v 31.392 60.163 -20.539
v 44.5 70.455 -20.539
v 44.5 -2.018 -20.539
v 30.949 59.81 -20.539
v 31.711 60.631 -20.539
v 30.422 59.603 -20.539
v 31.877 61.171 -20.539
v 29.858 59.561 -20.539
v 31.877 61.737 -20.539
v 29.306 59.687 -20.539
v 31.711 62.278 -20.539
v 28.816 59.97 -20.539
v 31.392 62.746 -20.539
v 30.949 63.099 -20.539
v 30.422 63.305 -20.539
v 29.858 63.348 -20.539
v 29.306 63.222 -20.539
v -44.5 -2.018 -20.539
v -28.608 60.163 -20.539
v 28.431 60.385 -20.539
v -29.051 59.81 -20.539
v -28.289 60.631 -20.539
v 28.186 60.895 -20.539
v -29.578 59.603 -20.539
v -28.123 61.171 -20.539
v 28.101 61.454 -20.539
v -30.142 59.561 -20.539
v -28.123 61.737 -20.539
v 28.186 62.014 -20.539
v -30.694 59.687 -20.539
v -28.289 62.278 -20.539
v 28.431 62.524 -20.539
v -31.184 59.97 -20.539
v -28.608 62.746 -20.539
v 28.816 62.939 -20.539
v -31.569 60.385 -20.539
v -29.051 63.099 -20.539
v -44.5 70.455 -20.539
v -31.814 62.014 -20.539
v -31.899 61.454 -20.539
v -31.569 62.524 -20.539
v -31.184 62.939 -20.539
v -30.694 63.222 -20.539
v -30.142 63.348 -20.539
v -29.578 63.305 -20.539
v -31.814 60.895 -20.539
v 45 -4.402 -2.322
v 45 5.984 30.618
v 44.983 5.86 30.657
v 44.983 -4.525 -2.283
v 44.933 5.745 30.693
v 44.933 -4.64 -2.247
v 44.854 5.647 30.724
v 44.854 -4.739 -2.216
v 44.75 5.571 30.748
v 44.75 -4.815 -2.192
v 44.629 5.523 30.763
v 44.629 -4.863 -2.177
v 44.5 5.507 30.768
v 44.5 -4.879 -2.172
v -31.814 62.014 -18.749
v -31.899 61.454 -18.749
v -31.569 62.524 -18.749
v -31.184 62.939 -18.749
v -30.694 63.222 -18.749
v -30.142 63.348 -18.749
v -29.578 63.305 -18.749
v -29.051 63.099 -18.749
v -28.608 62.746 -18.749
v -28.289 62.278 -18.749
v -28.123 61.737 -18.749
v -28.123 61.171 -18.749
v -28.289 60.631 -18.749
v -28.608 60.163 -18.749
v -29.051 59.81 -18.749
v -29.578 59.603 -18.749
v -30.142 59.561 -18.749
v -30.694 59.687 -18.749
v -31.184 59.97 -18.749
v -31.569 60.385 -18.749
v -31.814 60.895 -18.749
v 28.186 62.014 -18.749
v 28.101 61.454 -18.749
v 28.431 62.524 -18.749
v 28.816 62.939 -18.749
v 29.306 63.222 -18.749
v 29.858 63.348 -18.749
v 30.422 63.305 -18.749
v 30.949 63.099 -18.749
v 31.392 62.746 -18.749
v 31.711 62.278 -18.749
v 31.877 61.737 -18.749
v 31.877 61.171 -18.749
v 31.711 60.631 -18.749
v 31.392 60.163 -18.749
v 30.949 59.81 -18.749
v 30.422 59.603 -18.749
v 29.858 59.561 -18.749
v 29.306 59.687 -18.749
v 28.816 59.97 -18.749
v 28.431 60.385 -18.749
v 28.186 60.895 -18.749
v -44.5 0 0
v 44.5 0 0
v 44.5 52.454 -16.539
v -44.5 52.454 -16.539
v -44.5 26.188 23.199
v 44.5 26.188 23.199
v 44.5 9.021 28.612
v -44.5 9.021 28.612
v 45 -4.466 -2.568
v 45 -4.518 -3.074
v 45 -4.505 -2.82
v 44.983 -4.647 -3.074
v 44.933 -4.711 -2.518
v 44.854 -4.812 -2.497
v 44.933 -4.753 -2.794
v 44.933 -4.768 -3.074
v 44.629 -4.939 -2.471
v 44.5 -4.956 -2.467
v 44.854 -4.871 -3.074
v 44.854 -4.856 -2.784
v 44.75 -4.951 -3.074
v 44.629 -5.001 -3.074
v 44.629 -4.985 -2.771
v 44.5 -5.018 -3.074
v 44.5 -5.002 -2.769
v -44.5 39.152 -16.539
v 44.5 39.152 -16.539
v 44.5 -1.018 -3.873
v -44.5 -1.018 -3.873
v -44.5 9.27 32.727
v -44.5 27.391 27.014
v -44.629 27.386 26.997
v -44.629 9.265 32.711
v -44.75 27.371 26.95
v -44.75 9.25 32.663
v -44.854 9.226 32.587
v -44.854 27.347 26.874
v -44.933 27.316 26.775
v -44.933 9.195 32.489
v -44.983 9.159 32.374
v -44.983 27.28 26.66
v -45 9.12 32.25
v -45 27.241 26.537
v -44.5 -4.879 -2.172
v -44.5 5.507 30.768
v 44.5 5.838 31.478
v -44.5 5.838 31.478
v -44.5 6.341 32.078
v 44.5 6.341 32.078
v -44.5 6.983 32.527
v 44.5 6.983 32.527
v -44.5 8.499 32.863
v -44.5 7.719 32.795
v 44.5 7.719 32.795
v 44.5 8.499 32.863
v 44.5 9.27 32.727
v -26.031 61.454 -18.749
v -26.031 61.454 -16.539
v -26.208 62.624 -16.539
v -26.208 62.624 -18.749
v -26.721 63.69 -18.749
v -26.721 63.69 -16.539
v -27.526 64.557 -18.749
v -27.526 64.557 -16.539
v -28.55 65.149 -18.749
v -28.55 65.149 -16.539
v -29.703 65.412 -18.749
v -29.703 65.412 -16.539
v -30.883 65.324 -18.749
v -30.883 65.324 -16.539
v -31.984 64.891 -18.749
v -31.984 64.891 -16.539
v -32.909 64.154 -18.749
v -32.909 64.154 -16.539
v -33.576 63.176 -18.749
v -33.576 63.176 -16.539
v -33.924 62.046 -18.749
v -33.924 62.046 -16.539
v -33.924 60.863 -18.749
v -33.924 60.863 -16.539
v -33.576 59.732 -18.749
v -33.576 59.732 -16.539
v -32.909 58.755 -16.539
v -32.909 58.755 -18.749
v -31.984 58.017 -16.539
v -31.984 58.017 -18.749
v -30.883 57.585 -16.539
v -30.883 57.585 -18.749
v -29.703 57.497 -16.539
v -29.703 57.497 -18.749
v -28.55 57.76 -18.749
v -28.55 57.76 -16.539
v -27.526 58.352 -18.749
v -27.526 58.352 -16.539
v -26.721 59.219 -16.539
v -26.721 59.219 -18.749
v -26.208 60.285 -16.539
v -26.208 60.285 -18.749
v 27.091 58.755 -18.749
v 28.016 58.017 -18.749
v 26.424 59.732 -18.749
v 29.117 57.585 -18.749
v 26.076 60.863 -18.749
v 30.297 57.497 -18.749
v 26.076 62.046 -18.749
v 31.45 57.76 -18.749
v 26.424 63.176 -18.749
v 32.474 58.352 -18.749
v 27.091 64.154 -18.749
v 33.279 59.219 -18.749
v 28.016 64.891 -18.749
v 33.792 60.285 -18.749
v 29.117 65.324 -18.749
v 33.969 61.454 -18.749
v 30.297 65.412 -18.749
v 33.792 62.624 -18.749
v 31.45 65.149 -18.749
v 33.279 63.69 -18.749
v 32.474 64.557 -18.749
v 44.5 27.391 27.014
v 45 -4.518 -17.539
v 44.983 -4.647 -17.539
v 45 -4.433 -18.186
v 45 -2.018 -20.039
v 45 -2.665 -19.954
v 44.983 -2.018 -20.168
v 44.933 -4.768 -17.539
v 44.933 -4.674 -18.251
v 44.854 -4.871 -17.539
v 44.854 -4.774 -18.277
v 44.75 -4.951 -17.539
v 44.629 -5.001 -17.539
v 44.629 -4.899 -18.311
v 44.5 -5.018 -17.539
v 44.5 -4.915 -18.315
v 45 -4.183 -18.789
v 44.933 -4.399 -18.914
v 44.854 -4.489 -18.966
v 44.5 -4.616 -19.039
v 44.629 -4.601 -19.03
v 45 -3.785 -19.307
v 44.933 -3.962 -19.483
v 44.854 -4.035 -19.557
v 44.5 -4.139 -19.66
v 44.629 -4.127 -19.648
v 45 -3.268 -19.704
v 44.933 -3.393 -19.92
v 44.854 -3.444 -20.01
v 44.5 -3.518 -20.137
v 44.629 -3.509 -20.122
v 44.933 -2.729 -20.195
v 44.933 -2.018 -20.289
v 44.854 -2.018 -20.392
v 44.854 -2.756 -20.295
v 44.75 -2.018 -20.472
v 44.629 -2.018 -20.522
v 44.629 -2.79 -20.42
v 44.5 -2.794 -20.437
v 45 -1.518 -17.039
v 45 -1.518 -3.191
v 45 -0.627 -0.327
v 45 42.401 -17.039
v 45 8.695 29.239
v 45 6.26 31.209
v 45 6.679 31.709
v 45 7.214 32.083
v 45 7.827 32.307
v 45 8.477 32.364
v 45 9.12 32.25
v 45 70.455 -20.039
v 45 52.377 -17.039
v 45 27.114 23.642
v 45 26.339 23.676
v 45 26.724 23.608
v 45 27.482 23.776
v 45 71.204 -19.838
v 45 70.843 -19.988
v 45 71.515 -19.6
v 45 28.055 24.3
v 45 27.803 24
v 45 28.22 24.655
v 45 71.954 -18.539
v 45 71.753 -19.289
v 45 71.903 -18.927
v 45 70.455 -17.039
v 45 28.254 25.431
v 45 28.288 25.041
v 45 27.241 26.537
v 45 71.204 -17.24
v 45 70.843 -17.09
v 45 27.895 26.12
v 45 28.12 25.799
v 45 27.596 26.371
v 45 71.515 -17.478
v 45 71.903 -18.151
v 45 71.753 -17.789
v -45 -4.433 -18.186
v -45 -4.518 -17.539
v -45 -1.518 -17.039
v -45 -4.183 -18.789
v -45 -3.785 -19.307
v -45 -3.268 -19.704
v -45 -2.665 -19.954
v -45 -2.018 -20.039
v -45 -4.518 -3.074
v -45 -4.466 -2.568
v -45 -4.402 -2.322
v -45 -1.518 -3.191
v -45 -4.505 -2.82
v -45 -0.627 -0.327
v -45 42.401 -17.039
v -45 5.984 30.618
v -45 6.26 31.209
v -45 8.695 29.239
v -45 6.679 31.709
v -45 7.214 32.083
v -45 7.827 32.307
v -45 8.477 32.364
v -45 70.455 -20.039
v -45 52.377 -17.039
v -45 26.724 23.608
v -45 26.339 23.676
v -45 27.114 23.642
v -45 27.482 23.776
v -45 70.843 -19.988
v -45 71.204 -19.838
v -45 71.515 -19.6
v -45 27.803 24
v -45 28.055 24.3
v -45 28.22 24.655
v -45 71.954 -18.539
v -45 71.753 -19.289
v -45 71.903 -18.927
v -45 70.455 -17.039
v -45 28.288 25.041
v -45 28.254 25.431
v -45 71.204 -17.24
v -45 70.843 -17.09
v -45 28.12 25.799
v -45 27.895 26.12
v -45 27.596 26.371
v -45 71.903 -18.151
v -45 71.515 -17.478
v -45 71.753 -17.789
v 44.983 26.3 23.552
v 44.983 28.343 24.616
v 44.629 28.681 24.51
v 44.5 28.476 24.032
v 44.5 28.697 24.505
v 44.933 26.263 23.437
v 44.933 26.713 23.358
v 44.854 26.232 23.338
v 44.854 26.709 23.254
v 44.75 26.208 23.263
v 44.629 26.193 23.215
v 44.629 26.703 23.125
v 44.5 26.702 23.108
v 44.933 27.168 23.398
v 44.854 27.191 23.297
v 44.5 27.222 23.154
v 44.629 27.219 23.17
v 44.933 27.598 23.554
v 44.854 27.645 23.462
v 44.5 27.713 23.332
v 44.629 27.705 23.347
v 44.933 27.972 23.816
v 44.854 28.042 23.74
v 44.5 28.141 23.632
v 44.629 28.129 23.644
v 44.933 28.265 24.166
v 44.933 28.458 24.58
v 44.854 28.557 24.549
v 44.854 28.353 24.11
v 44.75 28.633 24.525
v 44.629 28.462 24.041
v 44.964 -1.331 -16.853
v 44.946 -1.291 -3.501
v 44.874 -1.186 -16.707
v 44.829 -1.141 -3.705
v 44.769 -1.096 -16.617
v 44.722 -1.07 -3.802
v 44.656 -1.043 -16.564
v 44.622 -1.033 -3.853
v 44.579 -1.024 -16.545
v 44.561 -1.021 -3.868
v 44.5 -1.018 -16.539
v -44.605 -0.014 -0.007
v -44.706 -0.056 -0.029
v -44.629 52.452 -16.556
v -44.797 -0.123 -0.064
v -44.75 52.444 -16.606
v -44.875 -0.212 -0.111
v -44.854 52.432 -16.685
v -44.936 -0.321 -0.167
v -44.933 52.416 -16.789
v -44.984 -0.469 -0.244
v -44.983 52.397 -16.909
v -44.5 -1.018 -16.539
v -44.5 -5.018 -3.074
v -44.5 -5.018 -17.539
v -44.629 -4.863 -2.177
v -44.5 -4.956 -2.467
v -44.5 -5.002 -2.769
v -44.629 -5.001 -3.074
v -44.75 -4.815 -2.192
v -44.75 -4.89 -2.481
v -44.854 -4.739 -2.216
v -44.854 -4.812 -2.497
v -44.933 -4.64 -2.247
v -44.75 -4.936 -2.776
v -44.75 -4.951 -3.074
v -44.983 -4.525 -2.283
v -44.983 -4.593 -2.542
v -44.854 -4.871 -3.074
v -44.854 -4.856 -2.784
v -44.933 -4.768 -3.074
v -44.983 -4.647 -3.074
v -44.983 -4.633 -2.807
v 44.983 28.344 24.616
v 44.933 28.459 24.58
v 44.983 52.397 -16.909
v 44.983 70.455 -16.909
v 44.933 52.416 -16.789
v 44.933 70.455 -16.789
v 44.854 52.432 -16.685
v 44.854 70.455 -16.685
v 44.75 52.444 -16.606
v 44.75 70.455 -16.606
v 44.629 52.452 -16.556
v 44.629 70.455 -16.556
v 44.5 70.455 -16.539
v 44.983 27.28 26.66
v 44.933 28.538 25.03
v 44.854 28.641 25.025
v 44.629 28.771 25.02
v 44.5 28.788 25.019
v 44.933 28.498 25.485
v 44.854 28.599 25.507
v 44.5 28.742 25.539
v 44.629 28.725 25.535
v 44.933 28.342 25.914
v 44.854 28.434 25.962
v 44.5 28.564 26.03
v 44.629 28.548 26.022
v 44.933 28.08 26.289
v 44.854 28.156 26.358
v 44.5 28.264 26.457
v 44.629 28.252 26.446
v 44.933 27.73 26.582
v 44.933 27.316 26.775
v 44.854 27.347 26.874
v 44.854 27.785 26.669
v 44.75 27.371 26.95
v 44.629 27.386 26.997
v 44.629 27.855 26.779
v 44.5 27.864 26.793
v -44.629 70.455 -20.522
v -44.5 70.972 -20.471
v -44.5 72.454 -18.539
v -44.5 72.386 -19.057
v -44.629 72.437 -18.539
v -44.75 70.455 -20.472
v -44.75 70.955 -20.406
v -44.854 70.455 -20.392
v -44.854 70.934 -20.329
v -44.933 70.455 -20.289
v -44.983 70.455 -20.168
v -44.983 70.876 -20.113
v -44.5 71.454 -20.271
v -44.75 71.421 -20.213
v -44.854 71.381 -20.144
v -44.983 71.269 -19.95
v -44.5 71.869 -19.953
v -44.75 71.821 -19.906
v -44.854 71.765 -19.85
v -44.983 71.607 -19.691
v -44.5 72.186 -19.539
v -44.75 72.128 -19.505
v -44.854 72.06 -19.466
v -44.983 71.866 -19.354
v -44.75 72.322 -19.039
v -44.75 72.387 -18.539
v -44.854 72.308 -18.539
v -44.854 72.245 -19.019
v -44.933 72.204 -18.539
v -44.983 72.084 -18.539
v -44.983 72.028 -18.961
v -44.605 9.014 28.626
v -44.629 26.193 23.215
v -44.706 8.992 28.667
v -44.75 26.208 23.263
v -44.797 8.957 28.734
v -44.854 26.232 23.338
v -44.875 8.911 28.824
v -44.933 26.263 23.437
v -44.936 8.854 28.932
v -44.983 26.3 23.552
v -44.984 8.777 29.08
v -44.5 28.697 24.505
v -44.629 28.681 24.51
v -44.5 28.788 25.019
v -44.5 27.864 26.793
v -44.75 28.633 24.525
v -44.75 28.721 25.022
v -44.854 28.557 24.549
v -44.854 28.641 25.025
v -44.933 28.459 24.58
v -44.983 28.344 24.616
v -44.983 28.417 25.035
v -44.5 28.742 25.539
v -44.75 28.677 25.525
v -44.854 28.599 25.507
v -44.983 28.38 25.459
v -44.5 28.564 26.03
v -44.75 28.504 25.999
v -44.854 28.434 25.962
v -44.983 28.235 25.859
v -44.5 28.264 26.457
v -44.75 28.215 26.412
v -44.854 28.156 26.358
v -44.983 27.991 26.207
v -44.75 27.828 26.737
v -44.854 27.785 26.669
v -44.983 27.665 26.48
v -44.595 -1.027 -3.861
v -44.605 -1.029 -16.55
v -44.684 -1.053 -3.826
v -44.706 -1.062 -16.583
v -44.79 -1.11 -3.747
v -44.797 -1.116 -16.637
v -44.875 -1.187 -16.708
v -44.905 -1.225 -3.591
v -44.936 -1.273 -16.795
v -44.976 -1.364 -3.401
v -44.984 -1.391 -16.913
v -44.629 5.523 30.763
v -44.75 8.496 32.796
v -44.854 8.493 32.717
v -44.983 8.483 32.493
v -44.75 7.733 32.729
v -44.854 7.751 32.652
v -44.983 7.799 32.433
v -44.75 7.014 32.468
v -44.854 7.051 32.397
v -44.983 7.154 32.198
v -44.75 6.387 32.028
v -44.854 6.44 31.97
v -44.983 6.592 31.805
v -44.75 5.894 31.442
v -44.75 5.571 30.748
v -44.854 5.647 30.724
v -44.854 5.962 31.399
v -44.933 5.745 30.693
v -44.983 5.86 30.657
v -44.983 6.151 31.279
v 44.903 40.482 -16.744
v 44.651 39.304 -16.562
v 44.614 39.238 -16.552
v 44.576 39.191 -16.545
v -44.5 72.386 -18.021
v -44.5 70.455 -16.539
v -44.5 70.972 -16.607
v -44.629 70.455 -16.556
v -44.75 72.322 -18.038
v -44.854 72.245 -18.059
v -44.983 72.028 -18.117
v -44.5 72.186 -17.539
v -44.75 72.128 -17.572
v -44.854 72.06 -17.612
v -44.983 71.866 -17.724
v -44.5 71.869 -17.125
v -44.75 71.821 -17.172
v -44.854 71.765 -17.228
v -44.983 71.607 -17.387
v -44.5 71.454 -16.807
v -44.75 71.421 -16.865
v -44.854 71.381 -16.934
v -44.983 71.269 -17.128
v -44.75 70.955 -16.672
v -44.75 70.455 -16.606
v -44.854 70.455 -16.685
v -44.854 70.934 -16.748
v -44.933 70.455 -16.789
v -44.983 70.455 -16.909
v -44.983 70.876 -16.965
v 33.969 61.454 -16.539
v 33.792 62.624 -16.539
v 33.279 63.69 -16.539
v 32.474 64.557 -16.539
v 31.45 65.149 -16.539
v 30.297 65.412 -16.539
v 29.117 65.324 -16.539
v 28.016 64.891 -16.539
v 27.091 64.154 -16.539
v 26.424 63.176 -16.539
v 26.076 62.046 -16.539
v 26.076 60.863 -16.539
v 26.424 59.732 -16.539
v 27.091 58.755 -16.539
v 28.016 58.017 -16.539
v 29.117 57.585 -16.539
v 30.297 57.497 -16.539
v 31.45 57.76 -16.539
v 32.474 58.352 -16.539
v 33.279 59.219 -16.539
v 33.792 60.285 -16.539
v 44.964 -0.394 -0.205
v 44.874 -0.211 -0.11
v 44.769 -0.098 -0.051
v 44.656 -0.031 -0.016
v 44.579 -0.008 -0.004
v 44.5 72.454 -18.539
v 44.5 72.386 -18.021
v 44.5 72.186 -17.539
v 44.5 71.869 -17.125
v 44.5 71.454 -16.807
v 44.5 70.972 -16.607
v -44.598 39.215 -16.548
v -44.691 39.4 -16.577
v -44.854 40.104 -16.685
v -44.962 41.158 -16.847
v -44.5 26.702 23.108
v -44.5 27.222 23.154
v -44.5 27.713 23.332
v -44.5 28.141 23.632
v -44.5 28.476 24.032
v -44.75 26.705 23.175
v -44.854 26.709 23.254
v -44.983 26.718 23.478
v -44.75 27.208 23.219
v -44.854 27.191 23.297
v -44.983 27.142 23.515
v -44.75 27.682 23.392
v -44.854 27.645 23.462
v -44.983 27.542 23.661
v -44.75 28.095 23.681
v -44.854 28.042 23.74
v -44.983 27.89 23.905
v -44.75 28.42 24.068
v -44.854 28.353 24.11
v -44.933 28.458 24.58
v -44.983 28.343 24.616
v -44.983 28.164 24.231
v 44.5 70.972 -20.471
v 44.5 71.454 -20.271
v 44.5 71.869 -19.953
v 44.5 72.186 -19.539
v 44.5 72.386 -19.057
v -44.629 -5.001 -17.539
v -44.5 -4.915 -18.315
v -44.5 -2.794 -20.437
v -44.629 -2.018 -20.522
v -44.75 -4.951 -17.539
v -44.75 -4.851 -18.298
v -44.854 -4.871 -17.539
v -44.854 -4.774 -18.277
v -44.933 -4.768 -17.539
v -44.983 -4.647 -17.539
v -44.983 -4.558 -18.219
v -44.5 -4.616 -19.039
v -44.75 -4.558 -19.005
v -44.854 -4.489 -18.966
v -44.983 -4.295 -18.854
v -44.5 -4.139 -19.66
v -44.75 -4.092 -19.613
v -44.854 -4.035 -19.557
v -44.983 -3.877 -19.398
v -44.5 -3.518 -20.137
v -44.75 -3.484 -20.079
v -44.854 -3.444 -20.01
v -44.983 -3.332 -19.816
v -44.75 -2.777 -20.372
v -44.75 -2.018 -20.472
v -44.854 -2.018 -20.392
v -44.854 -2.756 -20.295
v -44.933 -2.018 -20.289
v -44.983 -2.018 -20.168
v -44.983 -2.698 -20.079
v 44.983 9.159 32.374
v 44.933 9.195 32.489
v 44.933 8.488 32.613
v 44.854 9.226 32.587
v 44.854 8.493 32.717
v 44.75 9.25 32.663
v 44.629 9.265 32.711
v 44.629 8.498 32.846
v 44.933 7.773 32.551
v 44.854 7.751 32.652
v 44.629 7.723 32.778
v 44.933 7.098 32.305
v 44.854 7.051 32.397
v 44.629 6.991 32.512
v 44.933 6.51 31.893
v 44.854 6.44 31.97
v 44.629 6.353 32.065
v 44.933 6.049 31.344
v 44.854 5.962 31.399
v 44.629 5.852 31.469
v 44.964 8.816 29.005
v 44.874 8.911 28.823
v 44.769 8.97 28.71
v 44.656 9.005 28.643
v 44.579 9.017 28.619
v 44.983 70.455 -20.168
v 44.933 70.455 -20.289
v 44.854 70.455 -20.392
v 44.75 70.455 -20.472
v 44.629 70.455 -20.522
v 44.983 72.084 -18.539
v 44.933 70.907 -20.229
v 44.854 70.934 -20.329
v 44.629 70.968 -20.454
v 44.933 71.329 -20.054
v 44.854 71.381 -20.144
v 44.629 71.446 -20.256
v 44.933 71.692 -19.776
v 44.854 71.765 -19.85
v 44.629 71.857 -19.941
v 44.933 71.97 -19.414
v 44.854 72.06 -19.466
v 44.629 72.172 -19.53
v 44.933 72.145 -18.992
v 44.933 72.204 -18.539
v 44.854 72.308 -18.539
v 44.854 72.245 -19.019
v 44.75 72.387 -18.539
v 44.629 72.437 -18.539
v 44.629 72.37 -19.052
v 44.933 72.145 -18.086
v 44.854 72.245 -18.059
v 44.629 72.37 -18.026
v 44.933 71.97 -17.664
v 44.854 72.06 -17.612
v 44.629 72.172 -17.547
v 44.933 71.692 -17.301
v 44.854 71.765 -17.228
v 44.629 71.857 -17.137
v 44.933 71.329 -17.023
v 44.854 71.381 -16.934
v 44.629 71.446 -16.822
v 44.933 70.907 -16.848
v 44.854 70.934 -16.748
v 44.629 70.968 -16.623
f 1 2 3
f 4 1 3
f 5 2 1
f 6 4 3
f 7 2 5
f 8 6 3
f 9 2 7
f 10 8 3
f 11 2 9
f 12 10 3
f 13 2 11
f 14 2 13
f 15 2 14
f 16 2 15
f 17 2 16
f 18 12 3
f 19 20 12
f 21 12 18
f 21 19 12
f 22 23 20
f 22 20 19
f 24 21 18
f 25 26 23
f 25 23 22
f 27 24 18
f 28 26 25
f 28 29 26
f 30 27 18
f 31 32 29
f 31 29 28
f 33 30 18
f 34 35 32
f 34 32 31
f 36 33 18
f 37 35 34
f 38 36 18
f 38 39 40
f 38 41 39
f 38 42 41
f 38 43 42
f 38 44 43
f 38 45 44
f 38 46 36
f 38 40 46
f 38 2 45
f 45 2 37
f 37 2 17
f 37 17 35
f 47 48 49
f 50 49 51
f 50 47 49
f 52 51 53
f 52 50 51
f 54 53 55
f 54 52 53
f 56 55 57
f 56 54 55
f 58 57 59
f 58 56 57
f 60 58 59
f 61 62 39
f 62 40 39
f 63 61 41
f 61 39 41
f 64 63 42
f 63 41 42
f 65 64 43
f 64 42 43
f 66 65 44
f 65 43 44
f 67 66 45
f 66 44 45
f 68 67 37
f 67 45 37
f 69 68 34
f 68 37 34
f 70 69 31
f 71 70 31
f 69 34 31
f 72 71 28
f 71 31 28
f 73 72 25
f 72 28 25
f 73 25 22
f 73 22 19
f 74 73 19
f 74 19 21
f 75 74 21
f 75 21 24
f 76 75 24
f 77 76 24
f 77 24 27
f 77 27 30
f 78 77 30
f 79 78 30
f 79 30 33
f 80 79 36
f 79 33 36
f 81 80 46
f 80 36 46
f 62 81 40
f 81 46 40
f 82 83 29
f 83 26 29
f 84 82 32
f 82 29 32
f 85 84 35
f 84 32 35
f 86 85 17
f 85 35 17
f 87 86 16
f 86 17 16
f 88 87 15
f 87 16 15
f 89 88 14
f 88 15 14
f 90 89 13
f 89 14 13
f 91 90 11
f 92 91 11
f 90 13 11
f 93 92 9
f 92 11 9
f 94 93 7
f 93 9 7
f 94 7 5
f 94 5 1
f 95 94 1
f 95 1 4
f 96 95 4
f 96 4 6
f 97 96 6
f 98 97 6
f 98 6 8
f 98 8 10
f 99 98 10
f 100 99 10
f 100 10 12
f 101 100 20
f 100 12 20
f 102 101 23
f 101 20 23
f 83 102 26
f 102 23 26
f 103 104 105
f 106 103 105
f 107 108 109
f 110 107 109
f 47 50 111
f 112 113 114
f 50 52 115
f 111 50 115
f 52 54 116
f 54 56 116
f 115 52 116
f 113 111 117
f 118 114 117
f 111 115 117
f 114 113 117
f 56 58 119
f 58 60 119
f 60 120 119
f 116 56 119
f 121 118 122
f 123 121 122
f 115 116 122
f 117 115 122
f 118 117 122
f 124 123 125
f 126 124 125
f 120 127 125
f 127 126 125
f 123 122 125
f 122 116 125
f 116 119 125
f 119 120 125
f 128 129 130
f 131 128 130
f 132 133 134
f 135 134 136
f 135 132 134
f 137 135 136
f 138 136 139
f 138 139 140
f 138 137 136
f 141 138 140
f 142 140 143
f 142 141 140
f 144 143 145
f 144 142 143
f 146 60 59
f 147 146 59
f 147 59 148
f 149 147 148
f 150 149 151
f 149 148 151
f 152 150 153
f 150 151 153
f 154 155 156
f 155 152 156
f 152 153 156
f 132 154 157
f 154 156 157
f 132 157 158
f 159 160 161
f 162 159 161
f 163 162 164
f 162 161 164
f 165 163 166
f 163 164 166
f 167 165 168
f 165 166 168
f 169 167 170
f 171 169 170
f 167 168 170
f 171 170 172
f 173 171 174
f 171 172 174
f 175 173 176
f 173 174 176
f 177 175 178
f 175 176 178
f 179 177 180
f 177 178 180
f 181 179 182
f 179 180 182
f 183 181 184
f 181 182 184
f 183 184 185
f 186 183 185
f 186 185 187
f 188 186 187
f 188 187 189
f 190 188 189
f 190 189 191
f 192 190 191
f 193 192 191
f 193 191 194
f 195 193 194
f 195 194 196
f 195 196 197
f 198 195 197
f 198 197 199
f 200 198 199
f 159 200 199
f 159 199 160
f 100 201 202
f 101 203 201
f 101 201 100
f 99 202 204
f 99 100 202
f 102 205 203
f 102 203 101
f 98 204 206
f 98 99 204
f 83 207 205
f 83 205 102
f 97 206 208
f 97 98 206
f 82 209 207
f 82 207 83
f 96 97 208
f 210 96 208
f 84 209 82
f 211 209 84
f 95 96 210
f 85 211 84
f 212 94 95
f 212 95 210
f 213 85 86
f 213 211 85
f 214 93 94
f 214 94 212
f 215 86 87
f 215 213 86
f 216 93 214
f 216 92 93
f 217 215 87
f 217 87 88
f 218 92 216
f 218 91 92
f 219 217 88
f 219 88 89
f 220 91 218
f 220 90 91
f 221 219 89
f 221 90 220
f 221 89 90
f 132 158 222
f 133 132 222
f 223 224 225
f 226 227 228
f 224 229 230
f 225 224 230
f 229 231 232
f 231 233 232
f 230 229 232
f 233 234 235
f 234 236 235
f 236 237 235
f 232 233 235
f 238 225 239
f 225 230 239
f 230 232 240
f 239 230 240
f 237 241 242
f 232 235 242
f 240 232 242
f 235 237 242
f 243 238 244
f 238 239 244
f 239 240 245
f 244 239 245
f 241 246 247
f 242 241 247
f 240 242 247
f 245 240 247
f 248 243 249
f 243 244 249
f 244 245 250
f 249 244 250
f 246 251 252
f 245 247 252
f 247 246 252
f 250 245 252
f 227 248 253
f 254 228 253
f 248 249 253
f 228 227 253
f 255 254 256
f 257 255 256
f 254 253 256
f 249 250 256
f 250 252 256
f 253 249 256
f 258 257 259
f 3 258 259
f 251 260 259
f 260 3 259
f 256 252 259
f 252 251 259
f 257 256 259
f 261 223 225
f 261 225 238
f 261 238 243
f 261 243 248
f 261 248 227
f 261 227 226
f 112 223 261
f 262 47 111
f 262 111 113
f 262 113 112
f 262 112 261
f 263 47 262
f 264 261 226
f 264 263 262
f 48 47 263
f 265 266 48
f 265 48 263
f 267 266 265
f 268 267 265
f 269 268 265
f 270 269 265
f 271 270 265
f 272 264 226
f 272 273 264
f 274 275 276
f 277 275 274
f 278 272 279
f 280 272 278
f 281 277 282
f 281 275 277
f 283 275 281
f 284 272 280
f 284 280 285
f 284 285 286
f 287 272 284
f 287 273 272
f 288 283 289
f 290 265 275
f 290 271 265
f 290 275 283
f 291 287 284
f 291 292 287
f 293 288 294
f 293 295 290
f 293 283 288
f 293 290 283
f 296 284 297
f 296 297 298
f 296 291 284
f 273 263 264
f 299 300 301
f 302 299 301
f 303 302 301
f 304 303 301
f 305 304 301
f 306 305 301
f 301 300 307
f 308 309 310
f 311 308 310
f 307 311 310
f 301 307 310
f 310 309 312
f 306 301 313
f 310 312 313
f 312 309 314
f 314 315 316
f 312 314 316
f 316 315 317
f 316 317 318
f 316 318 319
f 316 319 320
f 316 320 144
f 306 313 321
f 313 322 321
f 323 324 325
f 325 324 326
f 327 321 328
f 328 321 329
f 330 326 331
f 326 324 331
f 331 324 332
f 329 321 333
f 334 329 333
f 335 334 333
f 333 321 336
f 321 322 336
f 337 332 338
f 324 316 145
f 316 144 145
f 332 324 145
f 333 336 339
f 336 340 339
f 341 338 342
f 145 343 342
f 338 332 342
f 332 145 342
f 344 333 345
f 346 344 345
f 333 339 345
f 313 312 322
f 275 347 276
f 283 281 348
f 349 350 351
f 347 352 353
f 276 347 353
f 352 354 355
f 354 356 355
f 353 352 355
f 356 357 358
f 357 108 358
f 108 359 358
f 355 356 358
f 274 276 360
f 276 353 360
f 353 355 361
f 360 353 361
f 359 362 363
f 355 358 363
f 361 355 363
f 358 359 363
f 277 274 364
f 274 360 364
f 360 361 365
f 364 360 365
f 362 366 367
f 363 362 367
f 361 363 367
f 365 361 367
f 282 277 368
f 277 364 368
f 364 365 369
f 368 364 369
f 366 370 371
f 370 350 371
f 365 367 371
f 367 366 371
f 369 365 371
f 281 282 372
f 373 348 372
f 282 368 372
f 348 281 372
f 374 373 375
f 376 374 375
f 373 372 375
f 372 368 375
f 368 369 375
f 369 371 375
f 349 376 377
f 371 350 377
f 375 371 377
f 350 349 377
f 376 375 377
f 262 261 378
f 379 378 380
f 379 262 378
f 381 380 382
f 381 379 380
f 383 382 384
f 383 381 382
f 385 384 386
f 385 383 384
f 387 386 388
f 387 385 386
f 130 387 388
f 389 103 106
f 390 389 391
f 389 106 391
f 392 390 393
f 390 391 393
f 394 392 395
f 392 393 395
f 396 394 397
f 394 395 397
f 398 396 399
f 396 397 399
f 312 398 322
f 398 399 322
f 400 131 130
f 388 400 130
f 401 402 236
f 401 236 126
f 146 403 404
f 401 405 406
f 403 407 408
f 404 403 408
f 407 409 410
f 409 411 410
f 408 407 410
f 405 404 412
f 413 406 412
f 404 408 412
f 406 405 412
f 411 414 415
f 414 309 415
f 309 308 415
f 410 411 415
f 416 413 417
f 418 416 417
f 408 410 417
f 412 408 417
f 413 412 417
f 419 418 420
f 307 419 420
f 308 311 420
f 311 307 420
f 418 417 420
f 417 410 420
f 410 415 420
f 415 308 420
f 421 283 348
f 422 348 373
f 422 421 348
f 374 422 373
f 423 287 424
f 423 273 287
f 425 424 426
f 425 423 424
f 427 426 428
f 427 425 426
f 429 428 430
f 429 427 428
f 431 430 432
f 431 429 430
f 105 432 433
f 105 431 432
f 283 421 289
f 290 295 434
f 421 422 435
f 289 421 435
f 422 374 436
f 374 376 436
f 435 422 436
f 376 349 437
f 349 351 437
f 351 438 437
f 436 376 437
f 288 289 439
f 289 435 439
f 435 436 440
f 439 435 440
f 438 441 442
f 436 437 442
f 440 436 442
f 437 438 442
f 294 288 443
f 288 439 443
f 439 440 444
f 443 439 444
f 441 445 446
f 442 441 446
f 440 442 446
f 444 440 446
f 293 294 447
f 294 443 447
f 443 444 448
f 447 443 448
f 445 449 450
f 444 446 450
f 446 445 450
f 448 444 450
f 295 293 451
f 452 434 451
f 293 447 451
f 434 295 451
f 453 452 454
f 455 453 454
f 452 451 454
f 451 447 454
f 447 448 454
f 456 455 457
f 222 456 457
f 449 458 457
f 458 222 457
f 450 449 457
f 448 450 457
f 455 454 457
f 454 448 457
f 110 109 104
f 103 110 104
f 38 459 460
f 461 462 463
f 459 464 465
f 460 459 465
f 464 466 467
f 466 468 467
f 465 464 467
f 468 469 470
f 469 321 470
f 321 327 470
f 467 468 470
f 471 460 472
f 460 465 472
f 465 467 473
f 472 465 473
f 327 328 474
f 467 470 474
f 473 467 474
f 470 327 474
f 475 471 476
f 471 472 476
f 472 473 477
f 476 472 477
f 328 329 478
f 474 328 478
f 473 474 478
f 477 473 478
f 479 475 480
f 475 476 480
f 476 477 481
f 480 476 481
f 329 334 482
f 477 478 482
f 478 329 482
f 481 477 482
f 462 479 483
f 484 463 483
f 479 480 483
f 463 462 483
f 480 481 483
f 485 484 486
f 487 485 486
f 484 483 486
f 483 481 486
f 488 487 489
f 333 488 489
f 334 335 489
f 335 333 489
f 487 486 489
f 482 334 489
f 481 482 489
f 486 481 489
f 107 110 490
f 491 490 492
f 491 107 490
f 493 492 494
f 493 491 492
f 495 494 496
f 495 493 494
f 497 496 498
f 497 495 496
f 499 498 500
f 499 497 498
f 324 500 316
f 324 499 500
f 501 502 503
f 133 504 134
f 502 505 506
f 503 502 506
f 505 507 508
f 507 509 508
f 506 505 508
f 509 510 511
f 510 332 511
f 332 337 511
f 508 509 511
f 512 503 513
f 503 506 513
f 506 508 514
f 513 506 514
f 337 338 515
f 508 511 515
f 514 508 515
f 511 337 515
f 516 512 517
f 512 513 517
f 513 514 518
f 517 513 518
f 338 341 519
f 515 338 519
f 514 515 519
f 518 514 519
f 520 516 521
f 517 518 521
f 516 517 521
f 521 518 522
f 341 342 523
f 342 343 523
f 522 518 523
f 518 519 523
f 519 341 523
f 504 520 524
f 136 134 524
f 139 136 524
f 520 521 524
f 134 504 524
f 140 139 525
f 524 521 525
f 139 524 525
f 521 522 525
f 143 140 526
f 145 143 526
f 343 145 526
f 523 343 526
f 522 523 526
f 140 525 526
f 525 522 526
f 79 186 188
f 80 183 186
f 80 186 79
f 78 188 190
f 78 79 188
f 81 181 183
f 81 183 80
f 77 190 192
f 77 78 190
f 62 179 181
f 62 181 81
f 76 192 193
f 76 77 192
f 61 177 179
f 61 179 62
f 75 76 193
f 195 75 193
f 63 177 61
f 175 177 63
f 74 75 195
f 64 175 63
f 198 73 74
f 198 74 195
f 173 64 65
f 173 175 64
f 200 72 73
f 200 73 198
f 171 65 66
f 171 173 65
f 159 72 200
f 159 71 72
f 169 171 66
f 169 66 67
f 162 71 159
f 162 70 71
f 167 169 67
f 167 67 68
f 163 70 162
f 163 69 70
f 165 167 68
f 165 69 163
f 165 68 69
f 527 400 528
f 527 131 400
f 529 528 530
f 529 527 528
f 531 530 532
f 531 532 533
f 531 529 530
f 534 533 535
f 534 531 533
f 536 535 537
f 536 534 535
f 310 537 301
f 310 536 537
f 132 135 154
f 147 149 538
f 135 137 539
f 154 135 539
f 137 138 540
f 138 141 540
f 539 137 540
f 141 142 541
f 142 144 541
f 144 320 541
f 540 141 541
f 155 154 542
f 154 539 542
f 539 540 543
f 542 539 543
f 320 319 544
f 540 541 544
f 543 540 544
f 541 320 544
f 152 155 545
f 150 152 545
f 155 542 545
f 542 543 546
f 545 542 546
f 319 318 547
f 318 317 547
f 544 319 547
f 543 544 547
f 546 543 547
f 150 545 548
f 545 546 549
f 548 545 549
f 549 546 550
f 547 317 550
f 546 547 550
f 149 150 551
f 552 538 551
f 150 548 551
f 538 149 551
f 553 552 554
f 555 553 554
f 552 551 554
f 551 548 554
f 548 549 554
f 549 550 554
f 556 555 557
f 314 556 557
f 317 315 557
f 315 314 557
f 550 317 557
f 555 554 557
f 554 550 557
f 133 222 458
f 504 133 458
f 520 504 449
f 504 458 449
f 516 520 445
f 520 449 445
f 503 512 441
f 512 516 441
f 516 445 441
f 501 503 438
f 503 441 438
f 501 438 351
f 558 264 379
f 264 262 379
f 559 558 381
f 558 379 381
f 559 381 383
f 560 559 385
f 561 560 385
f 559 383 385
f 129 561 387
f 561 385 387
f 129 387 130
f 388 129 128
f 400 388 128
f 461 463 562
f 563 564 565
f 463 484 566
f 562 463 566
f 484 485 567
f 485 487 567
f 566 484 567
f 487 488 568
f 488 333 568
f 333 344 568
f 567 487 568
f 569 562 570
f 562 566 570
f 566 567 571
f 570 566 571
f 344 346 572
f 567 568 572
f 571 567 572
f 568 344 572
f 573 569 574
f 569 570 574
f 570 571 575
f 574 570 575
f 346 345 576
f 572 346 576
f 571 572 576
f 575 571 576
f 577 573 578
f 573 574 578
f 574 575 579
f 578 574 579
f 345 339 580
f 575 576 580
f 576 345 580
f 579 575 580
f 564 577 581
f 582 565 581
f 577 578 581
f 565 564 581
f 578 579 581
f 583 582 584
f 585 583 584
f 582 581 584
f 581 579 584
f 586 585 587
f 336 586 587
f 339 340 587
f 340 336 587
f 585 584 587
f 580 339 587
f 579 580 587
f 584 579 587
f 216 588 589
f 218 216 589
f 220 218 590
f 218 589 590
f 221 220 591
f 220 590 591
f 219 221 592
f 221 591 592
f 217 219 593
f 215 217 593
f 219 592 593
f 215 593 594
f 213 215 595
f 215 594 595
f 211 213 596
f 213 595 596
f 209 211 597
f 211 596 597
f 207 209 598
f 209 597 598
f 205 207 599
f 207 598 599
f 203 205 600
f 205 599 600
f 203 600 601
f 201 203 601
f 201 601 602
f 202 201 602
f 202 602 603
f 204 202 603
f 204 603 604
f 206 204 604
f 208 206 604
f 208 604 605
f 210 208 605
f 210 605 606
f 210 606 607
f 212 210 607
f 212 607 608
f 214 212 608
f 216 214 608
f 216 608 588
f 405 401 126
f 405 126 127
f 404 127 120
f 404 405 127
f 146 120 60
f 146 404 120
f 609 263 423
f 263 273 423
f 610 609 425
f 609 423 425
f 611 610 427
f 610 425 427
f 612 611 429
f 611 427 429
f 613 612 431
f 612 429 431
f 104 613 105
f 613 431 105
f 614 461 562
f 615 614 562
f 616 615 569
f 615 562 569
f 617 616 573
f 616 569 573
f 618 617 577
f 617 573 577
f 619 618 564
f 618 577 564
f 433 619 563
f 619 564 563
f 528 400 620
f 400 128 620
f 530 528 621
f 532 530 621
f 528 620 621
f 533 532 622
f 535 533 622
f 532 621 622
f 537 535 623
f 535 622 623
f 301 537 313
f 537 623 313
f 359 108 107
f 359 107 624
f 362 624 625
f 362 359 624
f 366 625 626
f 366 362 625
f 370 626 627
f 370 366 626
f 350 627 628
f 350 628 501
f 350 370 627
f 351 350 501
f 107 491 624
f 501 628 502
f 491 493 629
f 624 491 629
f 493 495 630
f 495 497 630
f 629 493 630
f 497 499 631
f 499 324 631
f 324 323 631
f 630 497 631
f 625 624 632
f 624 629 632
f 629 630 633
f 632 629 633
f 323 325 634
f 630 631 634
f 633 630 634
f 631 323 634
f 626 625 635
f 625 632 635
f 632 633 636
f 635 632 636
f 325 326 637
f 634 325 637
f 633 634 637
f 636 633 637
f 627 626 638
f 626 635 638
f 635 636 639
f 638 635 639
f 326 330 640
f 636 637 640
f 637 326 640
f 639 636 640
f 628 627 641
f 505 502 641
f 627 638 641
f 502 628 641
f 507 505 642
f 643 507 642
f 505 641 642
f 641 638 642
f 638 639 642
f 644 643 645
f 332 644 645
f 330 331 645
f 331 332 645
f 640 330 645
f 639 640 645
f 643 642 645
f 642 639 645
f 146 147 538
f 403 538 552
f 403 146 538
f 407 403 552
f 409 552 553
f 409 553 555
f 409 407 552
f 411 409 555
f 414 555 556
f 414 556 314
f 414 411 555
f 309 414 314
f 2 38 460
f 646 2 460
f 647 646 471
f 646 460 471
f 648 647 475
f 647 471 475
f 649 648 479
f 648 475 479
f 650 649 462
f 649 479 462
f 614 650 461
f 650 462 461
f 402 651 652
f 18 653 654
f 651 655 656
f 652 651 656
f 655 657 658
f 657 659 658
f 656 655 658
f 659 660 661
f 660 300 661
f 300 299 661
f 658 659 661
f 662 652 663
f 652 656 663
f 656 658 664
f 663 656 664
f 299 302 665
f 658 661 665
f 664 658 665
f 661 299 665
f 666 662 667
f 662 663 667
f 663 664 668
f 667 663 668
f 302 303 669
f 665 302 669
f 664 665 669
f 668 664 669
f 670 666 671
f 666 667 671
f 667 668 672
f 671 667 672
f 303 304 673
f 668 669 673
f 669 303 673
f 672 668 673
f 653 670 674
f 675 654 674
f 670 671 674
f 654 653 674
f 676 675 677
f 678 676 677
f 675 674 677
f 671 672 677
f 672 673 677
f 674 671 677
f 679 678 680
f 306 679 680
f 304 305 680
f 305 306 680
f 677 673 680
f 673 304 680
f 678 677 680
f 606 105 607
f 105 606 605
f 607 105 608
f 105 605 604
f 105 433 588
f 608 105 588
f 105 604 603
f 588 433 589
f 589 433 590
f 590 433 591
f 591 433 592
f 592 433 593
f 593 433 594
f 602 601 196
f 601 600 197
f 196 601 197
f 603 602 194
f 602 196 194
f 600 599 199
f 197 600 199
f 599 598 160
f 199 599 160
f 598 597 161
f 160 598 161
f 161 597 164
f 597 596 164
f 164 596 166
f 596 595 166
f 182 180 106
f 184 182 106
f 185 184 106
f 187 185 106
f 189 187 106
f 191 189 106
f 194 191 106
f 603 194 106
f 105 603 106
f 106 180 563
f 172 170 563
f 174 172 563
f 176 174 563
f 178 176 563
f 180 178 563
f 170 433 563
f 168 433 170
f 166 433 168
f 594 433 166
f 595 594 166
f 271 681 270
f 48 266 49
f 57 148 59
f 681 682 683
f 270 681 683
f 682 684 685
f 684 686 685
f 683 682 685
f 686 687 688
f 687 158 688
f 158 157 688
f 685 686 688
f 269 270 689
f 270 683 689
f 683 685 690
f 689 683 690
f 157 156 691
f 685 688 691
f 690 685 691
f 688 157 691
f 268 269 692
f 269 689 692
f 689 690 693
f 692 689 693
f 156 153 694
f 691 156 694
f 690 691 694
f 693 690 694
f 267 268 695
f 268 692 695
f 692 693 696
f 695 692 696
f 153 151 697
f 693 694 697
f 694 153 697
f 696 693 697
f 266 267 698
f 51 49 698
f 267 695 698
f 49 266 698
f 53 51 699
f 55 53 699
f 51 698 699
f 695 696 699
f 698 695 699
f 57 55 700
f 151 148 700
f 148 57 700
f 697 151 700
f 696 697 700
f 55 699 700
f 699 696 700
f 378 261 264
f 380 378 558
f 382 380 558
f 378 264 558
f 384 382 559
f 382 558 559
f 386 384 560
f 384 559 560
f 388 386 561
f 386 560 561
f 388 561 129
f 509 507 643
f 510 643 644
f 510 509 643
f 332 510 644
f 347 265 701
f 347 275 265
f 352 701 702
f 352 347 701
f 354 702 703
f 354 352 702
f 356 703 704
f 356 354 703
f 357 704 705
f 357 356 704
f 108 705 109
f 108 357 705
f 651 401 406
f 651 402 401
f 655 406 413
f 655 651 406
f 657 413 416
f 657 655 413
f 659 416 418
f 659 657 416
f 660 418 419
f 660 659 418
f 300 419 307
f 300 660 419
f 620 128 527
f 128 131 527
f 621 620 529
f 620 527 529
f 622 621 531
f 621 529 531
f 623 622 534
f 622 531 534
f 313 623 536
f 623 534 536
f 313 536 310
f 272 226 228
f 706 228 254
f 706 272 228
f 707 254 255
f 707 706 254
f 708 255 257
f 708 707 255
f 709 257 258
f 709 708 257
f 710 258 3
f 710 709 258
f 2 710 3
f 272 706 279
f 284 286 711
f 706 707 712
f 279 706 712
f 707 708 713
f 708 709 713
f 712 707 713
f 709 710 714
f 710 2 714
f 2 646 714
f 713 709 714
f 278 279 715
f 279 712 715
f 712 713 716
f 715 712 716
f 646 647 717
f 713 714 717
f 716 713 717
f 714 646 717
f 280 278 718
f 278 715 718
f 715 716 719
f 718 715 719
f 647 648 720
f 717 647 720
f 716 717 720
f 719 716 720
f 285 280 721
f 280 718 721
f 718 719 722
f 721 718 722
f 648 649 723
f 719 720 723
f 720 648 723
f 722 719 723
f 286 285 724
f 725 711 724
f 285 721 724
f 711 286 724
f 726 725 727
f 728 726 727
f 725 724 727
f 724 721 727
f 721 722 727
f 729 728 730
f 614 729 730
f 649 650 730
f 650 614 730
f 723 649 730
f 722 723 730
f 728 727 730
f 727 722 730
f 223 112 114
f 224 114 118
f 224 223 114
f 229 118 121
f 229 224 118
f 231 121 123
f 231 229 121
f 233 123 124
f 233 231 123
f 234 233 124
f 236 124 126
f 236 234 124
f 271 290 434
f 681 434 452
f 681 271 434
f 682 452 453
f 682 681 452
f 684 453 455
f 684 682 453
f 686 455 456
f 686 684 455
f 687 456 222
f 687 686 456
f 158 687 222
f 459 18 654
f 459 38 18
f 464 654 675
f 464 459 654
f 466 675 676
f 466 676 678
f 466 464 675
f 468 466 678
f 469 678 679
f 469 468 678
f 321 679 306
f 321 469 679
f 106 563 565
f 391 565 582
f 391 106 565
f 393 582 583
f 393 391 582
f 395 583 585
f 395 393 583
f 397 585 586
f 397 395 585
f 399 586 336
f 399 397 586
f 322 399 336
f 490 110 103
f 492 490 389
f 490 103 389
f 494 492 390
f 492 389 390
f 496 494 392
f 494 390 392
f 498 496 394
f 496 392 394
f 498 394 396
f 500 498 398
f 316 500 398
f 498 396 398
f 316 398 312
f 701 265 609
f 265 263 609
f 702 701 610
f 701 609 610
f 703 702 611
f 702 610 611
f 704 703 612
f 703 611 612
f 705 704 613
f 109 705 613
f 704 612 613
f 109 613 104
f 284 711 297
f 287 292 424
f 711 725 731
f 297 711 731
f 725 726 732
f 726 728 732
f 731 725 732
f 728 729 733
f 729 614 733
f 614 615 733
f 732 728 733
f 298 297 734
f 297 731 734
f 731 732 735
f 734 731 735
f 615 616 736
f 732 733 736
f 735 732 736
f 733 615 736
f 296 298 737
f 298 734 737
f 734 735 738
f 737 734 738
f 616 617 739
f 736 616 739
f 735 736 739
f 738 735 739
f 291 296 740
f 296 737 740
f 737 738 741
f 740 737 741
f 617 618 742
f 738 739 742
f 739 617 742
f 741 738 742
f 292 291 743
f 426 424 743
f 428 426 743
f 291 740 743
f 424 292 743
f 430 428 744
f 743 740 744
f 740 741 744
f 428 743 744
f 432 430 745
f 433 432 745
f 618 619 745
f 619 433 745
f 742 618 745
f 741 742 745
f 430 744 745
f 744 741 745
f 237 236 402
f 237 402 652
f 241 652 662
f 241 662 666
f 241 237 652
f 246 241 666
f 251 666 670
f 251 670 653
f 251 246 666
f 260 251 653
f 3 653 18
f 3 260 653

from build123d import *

# Parameters (mm, degrees)
BOSS_EXTRUDE1_DEPTH                                 = 45
CUT_EXTRUDE1_DEPTH                                  = 119.485655068
SKETCH3_W                                           = 90
SKETCH3_H                                           = 97.472123292
BOSS_EXTRUDE2_DEPTH                                 = 4
SKETCH4_W                                           = 17.926774368
SKETCH4_H                                           = 20
CUT_EXTRUDE2_DEPTH                                  = 121.335230998
SKETCH5_W                                           = 90
SKETCH5_H                                           = 17.926774368
BOSS_EXTRUDE3_DEPTH                                 = 4
FILLET7_R                                           = 3
FILLET8_R                                           = 2
FILLET9_R                                           = 0.5
CBORE_FOR_6_BINDING_HEAD_MACHINE_SCREW1_D           = 3.7973
CBORE_FOR_6_BINDING_HEAD_MACHINE_SCREW1_CBORE_D     = 7.9375
CBORE_FOR_6_BINDING_HEAD_MACHINE_SCREW1_CBORE_DEPTH = 2.2098


with BuildPart() as part:
    # Sketch1 → Boss-Extrude1 (new, symmetric)
    with BuildSketch(Plane(origin=(0, 0, 0), x_dir=(0, 0, -1), z_dir=(1, 0, 0))):
        Polygon((-22.597392532, 28.095513), (-28.611508522, 9.021173985), (0, 0), (16.538818973, 52.454432291), (26.538818973, 52.454432291), (55.495428229, -3.170696548), (56.456912684, -5.017691001), (51.947384896, -5.017691001), (24.111559387, 48.454432291), (19.471740318, 48.454432291), (2.612044605, -5.017691001), (-33.629199523, 6.40912938), (-26.412260335, 29.298336198), align=None)
    extrude(amount=BOSS_EXTRUDE1_DEPTH, both=True)

    # Sketch2 → Cut-Extrude1 (cut, through all)
    with BuildSketch(Plane(origin=(45, 0, 0), x_dir=(0, 0, -1), z_dir=(1, 0, 0))):
        Polygon((16.538818973, 52.454432291), (16.538818973, 39.152394197), (19.471740318, 48.454432291), (24.111559387, 48.454432291), (51.947384896, -5.017691001), (56.456912684, -5.017691001), (26.538818973, 52.454432291), align=None)
    extrude(amount=-CUT_EXTRUDE1_DEPTH, mode=Mode.SUBTRACT)

    # Sketch3 → Boss-Extrude2 (add)
    with BuildSketch(Plane(origin=(0, 0, -16.538818973), x_dir=(-1, 0, 0), z_dir=(0, 0, -1))):
        with Locations((0, 23.718370645)):
            Rectangle(SKETCH3_W, SKETCH3_H)
    extrude(amount=BOSS_EXTRUDE2_DEPTH)

    # Sketch4 → Cut-Extrude2 (cut, through all)
    with BuildSketch(Plane.ZY.offset(45)):
        with Locations((-11.575431789, -15.017691001)):
            Rectangle(SKETCH4_W, SKETCH4_H)
    extrude(amount=-CUT_EXTRUDE2_DEPTH, mode=Mode.SUBTRACT)

    # Sketch5 → Boss-Extrude3 (add)
    with BuildSketch(Plane.XZ.offset(5.017691001)):
        with Locations((0, -11.575431789)):
            Rectangle(SKETCH5_W, SKETCH5_H)
    extrude(amount=-BOSS_EXTRUDE3_DEPTH)

    # Fillet7
    fillet7_edges = [part.edges().sort_by_distance(p)[0] for p in [
        (0, -5.017691001, -2.612044605),
        (0, 6.40912938, 33.629199523),
        (0, -5.017691001, -20.538818973),
    ]]
    fillet(fillet7_edges, radius=FILLET7_R)

    # Fillet8
    fillet8_edges = [part.edges().sort_by_distance(p)[0] for p in [
        (0, 72.454432291, -16.538818973),
        (0, 28.095513, 22.597392532),
        (0, 72.454432291, -20.538818973),
        (0, 29.298336198, 26.412260335),
    ]]
    fillet(fillet8_edges, radius=FILLET8_R - 0.0001)  # a hair under: the kernel refuses the full size

    # Fillet9
    fillet9_edges = [part.edges().sort_by_distance(p)[0] for p in [
        (-45, 19.067351598, -16.538818973),
        (-45, 19.067351598, -10.206029367),
        (45, 19.067351598, -10.206029367),
        (-45, -1.017691001, -10.206029367),
        (45, -1.017691001, -10.206029367),
        (-45, 34.218420645, -20.538818973),
        (-45, -5.017691001, -10.30630387),
        (-45, 0.314085064, 14.298188651),
        (-45, 6.982916994, 32.526963772),
        (-45, -4.982775532, -2.61741861),
        (-45, 17.604674228, 25.905141292),
        (-45, -4.139011345, -19.660139316),
        (45, -5.017691001, -10.30630387),
        (45, 0.314085064, 14.298188651),
        (45, 6.982916994, 32.526963772),
        (-45, 4.510586993, 14.305754261),
        (45, -4.982775532, -2.61741861),
        (45, -4.139011345, -19.660139316),
        (-45, 26.227216146, -8.269409486),
        (45, 34.218420645, -20.538818973),
        (45, 61.454482291, -16.538818973),
        (45, 18.33063895, 29.870361994),
        (45, 28.563549105, 26.029754386),
        (45, 27.71300705, 23.332179625),
        (45, 71.868675143, -19.953061824),
        (45, 71.868675143, -17.124576121),
        (-45, 18.33063895, 29.870361994),
        (-45, 28.563549105, 26.029754386),
        (-45, 27.71300705, 23.332179625),
        (-45, 71.868675143, -19.953061824),
        (-45, 71.868675143, -17.124576121),
        (45, 26.227216146, -8.269409486),
        (45, 4.510586993, 14.305754261),
        (45, 17.604674228, 25.905141292),
        (-45, 61.454482291, -16.538818973),
        (45, 19.067351598, -16.538818973),
    ]]
    fillet(fillet9_edges, radius=FILLET9_R)

    # CBORE for #6 Binding Head Machine Screw1 (through all)
    with Locations(Plane.XY.offset(-16.538818973)):
        with Locations((-30, 61.454432291), (30, 61.454432291)):
            CounterBoreHole(CBORE_FOR_6_BINDING_HEAD_MACHINE_SCREW1_D / 2, CBORE_FOR_6_BINDING_HEAD_MACHINE_SCREW1_CBORE_D / 2, CBORE_FOR_6_BINDING_HEAD_MACHINE_SCREW1_CBORE_DEPTH)


solid = part.part
